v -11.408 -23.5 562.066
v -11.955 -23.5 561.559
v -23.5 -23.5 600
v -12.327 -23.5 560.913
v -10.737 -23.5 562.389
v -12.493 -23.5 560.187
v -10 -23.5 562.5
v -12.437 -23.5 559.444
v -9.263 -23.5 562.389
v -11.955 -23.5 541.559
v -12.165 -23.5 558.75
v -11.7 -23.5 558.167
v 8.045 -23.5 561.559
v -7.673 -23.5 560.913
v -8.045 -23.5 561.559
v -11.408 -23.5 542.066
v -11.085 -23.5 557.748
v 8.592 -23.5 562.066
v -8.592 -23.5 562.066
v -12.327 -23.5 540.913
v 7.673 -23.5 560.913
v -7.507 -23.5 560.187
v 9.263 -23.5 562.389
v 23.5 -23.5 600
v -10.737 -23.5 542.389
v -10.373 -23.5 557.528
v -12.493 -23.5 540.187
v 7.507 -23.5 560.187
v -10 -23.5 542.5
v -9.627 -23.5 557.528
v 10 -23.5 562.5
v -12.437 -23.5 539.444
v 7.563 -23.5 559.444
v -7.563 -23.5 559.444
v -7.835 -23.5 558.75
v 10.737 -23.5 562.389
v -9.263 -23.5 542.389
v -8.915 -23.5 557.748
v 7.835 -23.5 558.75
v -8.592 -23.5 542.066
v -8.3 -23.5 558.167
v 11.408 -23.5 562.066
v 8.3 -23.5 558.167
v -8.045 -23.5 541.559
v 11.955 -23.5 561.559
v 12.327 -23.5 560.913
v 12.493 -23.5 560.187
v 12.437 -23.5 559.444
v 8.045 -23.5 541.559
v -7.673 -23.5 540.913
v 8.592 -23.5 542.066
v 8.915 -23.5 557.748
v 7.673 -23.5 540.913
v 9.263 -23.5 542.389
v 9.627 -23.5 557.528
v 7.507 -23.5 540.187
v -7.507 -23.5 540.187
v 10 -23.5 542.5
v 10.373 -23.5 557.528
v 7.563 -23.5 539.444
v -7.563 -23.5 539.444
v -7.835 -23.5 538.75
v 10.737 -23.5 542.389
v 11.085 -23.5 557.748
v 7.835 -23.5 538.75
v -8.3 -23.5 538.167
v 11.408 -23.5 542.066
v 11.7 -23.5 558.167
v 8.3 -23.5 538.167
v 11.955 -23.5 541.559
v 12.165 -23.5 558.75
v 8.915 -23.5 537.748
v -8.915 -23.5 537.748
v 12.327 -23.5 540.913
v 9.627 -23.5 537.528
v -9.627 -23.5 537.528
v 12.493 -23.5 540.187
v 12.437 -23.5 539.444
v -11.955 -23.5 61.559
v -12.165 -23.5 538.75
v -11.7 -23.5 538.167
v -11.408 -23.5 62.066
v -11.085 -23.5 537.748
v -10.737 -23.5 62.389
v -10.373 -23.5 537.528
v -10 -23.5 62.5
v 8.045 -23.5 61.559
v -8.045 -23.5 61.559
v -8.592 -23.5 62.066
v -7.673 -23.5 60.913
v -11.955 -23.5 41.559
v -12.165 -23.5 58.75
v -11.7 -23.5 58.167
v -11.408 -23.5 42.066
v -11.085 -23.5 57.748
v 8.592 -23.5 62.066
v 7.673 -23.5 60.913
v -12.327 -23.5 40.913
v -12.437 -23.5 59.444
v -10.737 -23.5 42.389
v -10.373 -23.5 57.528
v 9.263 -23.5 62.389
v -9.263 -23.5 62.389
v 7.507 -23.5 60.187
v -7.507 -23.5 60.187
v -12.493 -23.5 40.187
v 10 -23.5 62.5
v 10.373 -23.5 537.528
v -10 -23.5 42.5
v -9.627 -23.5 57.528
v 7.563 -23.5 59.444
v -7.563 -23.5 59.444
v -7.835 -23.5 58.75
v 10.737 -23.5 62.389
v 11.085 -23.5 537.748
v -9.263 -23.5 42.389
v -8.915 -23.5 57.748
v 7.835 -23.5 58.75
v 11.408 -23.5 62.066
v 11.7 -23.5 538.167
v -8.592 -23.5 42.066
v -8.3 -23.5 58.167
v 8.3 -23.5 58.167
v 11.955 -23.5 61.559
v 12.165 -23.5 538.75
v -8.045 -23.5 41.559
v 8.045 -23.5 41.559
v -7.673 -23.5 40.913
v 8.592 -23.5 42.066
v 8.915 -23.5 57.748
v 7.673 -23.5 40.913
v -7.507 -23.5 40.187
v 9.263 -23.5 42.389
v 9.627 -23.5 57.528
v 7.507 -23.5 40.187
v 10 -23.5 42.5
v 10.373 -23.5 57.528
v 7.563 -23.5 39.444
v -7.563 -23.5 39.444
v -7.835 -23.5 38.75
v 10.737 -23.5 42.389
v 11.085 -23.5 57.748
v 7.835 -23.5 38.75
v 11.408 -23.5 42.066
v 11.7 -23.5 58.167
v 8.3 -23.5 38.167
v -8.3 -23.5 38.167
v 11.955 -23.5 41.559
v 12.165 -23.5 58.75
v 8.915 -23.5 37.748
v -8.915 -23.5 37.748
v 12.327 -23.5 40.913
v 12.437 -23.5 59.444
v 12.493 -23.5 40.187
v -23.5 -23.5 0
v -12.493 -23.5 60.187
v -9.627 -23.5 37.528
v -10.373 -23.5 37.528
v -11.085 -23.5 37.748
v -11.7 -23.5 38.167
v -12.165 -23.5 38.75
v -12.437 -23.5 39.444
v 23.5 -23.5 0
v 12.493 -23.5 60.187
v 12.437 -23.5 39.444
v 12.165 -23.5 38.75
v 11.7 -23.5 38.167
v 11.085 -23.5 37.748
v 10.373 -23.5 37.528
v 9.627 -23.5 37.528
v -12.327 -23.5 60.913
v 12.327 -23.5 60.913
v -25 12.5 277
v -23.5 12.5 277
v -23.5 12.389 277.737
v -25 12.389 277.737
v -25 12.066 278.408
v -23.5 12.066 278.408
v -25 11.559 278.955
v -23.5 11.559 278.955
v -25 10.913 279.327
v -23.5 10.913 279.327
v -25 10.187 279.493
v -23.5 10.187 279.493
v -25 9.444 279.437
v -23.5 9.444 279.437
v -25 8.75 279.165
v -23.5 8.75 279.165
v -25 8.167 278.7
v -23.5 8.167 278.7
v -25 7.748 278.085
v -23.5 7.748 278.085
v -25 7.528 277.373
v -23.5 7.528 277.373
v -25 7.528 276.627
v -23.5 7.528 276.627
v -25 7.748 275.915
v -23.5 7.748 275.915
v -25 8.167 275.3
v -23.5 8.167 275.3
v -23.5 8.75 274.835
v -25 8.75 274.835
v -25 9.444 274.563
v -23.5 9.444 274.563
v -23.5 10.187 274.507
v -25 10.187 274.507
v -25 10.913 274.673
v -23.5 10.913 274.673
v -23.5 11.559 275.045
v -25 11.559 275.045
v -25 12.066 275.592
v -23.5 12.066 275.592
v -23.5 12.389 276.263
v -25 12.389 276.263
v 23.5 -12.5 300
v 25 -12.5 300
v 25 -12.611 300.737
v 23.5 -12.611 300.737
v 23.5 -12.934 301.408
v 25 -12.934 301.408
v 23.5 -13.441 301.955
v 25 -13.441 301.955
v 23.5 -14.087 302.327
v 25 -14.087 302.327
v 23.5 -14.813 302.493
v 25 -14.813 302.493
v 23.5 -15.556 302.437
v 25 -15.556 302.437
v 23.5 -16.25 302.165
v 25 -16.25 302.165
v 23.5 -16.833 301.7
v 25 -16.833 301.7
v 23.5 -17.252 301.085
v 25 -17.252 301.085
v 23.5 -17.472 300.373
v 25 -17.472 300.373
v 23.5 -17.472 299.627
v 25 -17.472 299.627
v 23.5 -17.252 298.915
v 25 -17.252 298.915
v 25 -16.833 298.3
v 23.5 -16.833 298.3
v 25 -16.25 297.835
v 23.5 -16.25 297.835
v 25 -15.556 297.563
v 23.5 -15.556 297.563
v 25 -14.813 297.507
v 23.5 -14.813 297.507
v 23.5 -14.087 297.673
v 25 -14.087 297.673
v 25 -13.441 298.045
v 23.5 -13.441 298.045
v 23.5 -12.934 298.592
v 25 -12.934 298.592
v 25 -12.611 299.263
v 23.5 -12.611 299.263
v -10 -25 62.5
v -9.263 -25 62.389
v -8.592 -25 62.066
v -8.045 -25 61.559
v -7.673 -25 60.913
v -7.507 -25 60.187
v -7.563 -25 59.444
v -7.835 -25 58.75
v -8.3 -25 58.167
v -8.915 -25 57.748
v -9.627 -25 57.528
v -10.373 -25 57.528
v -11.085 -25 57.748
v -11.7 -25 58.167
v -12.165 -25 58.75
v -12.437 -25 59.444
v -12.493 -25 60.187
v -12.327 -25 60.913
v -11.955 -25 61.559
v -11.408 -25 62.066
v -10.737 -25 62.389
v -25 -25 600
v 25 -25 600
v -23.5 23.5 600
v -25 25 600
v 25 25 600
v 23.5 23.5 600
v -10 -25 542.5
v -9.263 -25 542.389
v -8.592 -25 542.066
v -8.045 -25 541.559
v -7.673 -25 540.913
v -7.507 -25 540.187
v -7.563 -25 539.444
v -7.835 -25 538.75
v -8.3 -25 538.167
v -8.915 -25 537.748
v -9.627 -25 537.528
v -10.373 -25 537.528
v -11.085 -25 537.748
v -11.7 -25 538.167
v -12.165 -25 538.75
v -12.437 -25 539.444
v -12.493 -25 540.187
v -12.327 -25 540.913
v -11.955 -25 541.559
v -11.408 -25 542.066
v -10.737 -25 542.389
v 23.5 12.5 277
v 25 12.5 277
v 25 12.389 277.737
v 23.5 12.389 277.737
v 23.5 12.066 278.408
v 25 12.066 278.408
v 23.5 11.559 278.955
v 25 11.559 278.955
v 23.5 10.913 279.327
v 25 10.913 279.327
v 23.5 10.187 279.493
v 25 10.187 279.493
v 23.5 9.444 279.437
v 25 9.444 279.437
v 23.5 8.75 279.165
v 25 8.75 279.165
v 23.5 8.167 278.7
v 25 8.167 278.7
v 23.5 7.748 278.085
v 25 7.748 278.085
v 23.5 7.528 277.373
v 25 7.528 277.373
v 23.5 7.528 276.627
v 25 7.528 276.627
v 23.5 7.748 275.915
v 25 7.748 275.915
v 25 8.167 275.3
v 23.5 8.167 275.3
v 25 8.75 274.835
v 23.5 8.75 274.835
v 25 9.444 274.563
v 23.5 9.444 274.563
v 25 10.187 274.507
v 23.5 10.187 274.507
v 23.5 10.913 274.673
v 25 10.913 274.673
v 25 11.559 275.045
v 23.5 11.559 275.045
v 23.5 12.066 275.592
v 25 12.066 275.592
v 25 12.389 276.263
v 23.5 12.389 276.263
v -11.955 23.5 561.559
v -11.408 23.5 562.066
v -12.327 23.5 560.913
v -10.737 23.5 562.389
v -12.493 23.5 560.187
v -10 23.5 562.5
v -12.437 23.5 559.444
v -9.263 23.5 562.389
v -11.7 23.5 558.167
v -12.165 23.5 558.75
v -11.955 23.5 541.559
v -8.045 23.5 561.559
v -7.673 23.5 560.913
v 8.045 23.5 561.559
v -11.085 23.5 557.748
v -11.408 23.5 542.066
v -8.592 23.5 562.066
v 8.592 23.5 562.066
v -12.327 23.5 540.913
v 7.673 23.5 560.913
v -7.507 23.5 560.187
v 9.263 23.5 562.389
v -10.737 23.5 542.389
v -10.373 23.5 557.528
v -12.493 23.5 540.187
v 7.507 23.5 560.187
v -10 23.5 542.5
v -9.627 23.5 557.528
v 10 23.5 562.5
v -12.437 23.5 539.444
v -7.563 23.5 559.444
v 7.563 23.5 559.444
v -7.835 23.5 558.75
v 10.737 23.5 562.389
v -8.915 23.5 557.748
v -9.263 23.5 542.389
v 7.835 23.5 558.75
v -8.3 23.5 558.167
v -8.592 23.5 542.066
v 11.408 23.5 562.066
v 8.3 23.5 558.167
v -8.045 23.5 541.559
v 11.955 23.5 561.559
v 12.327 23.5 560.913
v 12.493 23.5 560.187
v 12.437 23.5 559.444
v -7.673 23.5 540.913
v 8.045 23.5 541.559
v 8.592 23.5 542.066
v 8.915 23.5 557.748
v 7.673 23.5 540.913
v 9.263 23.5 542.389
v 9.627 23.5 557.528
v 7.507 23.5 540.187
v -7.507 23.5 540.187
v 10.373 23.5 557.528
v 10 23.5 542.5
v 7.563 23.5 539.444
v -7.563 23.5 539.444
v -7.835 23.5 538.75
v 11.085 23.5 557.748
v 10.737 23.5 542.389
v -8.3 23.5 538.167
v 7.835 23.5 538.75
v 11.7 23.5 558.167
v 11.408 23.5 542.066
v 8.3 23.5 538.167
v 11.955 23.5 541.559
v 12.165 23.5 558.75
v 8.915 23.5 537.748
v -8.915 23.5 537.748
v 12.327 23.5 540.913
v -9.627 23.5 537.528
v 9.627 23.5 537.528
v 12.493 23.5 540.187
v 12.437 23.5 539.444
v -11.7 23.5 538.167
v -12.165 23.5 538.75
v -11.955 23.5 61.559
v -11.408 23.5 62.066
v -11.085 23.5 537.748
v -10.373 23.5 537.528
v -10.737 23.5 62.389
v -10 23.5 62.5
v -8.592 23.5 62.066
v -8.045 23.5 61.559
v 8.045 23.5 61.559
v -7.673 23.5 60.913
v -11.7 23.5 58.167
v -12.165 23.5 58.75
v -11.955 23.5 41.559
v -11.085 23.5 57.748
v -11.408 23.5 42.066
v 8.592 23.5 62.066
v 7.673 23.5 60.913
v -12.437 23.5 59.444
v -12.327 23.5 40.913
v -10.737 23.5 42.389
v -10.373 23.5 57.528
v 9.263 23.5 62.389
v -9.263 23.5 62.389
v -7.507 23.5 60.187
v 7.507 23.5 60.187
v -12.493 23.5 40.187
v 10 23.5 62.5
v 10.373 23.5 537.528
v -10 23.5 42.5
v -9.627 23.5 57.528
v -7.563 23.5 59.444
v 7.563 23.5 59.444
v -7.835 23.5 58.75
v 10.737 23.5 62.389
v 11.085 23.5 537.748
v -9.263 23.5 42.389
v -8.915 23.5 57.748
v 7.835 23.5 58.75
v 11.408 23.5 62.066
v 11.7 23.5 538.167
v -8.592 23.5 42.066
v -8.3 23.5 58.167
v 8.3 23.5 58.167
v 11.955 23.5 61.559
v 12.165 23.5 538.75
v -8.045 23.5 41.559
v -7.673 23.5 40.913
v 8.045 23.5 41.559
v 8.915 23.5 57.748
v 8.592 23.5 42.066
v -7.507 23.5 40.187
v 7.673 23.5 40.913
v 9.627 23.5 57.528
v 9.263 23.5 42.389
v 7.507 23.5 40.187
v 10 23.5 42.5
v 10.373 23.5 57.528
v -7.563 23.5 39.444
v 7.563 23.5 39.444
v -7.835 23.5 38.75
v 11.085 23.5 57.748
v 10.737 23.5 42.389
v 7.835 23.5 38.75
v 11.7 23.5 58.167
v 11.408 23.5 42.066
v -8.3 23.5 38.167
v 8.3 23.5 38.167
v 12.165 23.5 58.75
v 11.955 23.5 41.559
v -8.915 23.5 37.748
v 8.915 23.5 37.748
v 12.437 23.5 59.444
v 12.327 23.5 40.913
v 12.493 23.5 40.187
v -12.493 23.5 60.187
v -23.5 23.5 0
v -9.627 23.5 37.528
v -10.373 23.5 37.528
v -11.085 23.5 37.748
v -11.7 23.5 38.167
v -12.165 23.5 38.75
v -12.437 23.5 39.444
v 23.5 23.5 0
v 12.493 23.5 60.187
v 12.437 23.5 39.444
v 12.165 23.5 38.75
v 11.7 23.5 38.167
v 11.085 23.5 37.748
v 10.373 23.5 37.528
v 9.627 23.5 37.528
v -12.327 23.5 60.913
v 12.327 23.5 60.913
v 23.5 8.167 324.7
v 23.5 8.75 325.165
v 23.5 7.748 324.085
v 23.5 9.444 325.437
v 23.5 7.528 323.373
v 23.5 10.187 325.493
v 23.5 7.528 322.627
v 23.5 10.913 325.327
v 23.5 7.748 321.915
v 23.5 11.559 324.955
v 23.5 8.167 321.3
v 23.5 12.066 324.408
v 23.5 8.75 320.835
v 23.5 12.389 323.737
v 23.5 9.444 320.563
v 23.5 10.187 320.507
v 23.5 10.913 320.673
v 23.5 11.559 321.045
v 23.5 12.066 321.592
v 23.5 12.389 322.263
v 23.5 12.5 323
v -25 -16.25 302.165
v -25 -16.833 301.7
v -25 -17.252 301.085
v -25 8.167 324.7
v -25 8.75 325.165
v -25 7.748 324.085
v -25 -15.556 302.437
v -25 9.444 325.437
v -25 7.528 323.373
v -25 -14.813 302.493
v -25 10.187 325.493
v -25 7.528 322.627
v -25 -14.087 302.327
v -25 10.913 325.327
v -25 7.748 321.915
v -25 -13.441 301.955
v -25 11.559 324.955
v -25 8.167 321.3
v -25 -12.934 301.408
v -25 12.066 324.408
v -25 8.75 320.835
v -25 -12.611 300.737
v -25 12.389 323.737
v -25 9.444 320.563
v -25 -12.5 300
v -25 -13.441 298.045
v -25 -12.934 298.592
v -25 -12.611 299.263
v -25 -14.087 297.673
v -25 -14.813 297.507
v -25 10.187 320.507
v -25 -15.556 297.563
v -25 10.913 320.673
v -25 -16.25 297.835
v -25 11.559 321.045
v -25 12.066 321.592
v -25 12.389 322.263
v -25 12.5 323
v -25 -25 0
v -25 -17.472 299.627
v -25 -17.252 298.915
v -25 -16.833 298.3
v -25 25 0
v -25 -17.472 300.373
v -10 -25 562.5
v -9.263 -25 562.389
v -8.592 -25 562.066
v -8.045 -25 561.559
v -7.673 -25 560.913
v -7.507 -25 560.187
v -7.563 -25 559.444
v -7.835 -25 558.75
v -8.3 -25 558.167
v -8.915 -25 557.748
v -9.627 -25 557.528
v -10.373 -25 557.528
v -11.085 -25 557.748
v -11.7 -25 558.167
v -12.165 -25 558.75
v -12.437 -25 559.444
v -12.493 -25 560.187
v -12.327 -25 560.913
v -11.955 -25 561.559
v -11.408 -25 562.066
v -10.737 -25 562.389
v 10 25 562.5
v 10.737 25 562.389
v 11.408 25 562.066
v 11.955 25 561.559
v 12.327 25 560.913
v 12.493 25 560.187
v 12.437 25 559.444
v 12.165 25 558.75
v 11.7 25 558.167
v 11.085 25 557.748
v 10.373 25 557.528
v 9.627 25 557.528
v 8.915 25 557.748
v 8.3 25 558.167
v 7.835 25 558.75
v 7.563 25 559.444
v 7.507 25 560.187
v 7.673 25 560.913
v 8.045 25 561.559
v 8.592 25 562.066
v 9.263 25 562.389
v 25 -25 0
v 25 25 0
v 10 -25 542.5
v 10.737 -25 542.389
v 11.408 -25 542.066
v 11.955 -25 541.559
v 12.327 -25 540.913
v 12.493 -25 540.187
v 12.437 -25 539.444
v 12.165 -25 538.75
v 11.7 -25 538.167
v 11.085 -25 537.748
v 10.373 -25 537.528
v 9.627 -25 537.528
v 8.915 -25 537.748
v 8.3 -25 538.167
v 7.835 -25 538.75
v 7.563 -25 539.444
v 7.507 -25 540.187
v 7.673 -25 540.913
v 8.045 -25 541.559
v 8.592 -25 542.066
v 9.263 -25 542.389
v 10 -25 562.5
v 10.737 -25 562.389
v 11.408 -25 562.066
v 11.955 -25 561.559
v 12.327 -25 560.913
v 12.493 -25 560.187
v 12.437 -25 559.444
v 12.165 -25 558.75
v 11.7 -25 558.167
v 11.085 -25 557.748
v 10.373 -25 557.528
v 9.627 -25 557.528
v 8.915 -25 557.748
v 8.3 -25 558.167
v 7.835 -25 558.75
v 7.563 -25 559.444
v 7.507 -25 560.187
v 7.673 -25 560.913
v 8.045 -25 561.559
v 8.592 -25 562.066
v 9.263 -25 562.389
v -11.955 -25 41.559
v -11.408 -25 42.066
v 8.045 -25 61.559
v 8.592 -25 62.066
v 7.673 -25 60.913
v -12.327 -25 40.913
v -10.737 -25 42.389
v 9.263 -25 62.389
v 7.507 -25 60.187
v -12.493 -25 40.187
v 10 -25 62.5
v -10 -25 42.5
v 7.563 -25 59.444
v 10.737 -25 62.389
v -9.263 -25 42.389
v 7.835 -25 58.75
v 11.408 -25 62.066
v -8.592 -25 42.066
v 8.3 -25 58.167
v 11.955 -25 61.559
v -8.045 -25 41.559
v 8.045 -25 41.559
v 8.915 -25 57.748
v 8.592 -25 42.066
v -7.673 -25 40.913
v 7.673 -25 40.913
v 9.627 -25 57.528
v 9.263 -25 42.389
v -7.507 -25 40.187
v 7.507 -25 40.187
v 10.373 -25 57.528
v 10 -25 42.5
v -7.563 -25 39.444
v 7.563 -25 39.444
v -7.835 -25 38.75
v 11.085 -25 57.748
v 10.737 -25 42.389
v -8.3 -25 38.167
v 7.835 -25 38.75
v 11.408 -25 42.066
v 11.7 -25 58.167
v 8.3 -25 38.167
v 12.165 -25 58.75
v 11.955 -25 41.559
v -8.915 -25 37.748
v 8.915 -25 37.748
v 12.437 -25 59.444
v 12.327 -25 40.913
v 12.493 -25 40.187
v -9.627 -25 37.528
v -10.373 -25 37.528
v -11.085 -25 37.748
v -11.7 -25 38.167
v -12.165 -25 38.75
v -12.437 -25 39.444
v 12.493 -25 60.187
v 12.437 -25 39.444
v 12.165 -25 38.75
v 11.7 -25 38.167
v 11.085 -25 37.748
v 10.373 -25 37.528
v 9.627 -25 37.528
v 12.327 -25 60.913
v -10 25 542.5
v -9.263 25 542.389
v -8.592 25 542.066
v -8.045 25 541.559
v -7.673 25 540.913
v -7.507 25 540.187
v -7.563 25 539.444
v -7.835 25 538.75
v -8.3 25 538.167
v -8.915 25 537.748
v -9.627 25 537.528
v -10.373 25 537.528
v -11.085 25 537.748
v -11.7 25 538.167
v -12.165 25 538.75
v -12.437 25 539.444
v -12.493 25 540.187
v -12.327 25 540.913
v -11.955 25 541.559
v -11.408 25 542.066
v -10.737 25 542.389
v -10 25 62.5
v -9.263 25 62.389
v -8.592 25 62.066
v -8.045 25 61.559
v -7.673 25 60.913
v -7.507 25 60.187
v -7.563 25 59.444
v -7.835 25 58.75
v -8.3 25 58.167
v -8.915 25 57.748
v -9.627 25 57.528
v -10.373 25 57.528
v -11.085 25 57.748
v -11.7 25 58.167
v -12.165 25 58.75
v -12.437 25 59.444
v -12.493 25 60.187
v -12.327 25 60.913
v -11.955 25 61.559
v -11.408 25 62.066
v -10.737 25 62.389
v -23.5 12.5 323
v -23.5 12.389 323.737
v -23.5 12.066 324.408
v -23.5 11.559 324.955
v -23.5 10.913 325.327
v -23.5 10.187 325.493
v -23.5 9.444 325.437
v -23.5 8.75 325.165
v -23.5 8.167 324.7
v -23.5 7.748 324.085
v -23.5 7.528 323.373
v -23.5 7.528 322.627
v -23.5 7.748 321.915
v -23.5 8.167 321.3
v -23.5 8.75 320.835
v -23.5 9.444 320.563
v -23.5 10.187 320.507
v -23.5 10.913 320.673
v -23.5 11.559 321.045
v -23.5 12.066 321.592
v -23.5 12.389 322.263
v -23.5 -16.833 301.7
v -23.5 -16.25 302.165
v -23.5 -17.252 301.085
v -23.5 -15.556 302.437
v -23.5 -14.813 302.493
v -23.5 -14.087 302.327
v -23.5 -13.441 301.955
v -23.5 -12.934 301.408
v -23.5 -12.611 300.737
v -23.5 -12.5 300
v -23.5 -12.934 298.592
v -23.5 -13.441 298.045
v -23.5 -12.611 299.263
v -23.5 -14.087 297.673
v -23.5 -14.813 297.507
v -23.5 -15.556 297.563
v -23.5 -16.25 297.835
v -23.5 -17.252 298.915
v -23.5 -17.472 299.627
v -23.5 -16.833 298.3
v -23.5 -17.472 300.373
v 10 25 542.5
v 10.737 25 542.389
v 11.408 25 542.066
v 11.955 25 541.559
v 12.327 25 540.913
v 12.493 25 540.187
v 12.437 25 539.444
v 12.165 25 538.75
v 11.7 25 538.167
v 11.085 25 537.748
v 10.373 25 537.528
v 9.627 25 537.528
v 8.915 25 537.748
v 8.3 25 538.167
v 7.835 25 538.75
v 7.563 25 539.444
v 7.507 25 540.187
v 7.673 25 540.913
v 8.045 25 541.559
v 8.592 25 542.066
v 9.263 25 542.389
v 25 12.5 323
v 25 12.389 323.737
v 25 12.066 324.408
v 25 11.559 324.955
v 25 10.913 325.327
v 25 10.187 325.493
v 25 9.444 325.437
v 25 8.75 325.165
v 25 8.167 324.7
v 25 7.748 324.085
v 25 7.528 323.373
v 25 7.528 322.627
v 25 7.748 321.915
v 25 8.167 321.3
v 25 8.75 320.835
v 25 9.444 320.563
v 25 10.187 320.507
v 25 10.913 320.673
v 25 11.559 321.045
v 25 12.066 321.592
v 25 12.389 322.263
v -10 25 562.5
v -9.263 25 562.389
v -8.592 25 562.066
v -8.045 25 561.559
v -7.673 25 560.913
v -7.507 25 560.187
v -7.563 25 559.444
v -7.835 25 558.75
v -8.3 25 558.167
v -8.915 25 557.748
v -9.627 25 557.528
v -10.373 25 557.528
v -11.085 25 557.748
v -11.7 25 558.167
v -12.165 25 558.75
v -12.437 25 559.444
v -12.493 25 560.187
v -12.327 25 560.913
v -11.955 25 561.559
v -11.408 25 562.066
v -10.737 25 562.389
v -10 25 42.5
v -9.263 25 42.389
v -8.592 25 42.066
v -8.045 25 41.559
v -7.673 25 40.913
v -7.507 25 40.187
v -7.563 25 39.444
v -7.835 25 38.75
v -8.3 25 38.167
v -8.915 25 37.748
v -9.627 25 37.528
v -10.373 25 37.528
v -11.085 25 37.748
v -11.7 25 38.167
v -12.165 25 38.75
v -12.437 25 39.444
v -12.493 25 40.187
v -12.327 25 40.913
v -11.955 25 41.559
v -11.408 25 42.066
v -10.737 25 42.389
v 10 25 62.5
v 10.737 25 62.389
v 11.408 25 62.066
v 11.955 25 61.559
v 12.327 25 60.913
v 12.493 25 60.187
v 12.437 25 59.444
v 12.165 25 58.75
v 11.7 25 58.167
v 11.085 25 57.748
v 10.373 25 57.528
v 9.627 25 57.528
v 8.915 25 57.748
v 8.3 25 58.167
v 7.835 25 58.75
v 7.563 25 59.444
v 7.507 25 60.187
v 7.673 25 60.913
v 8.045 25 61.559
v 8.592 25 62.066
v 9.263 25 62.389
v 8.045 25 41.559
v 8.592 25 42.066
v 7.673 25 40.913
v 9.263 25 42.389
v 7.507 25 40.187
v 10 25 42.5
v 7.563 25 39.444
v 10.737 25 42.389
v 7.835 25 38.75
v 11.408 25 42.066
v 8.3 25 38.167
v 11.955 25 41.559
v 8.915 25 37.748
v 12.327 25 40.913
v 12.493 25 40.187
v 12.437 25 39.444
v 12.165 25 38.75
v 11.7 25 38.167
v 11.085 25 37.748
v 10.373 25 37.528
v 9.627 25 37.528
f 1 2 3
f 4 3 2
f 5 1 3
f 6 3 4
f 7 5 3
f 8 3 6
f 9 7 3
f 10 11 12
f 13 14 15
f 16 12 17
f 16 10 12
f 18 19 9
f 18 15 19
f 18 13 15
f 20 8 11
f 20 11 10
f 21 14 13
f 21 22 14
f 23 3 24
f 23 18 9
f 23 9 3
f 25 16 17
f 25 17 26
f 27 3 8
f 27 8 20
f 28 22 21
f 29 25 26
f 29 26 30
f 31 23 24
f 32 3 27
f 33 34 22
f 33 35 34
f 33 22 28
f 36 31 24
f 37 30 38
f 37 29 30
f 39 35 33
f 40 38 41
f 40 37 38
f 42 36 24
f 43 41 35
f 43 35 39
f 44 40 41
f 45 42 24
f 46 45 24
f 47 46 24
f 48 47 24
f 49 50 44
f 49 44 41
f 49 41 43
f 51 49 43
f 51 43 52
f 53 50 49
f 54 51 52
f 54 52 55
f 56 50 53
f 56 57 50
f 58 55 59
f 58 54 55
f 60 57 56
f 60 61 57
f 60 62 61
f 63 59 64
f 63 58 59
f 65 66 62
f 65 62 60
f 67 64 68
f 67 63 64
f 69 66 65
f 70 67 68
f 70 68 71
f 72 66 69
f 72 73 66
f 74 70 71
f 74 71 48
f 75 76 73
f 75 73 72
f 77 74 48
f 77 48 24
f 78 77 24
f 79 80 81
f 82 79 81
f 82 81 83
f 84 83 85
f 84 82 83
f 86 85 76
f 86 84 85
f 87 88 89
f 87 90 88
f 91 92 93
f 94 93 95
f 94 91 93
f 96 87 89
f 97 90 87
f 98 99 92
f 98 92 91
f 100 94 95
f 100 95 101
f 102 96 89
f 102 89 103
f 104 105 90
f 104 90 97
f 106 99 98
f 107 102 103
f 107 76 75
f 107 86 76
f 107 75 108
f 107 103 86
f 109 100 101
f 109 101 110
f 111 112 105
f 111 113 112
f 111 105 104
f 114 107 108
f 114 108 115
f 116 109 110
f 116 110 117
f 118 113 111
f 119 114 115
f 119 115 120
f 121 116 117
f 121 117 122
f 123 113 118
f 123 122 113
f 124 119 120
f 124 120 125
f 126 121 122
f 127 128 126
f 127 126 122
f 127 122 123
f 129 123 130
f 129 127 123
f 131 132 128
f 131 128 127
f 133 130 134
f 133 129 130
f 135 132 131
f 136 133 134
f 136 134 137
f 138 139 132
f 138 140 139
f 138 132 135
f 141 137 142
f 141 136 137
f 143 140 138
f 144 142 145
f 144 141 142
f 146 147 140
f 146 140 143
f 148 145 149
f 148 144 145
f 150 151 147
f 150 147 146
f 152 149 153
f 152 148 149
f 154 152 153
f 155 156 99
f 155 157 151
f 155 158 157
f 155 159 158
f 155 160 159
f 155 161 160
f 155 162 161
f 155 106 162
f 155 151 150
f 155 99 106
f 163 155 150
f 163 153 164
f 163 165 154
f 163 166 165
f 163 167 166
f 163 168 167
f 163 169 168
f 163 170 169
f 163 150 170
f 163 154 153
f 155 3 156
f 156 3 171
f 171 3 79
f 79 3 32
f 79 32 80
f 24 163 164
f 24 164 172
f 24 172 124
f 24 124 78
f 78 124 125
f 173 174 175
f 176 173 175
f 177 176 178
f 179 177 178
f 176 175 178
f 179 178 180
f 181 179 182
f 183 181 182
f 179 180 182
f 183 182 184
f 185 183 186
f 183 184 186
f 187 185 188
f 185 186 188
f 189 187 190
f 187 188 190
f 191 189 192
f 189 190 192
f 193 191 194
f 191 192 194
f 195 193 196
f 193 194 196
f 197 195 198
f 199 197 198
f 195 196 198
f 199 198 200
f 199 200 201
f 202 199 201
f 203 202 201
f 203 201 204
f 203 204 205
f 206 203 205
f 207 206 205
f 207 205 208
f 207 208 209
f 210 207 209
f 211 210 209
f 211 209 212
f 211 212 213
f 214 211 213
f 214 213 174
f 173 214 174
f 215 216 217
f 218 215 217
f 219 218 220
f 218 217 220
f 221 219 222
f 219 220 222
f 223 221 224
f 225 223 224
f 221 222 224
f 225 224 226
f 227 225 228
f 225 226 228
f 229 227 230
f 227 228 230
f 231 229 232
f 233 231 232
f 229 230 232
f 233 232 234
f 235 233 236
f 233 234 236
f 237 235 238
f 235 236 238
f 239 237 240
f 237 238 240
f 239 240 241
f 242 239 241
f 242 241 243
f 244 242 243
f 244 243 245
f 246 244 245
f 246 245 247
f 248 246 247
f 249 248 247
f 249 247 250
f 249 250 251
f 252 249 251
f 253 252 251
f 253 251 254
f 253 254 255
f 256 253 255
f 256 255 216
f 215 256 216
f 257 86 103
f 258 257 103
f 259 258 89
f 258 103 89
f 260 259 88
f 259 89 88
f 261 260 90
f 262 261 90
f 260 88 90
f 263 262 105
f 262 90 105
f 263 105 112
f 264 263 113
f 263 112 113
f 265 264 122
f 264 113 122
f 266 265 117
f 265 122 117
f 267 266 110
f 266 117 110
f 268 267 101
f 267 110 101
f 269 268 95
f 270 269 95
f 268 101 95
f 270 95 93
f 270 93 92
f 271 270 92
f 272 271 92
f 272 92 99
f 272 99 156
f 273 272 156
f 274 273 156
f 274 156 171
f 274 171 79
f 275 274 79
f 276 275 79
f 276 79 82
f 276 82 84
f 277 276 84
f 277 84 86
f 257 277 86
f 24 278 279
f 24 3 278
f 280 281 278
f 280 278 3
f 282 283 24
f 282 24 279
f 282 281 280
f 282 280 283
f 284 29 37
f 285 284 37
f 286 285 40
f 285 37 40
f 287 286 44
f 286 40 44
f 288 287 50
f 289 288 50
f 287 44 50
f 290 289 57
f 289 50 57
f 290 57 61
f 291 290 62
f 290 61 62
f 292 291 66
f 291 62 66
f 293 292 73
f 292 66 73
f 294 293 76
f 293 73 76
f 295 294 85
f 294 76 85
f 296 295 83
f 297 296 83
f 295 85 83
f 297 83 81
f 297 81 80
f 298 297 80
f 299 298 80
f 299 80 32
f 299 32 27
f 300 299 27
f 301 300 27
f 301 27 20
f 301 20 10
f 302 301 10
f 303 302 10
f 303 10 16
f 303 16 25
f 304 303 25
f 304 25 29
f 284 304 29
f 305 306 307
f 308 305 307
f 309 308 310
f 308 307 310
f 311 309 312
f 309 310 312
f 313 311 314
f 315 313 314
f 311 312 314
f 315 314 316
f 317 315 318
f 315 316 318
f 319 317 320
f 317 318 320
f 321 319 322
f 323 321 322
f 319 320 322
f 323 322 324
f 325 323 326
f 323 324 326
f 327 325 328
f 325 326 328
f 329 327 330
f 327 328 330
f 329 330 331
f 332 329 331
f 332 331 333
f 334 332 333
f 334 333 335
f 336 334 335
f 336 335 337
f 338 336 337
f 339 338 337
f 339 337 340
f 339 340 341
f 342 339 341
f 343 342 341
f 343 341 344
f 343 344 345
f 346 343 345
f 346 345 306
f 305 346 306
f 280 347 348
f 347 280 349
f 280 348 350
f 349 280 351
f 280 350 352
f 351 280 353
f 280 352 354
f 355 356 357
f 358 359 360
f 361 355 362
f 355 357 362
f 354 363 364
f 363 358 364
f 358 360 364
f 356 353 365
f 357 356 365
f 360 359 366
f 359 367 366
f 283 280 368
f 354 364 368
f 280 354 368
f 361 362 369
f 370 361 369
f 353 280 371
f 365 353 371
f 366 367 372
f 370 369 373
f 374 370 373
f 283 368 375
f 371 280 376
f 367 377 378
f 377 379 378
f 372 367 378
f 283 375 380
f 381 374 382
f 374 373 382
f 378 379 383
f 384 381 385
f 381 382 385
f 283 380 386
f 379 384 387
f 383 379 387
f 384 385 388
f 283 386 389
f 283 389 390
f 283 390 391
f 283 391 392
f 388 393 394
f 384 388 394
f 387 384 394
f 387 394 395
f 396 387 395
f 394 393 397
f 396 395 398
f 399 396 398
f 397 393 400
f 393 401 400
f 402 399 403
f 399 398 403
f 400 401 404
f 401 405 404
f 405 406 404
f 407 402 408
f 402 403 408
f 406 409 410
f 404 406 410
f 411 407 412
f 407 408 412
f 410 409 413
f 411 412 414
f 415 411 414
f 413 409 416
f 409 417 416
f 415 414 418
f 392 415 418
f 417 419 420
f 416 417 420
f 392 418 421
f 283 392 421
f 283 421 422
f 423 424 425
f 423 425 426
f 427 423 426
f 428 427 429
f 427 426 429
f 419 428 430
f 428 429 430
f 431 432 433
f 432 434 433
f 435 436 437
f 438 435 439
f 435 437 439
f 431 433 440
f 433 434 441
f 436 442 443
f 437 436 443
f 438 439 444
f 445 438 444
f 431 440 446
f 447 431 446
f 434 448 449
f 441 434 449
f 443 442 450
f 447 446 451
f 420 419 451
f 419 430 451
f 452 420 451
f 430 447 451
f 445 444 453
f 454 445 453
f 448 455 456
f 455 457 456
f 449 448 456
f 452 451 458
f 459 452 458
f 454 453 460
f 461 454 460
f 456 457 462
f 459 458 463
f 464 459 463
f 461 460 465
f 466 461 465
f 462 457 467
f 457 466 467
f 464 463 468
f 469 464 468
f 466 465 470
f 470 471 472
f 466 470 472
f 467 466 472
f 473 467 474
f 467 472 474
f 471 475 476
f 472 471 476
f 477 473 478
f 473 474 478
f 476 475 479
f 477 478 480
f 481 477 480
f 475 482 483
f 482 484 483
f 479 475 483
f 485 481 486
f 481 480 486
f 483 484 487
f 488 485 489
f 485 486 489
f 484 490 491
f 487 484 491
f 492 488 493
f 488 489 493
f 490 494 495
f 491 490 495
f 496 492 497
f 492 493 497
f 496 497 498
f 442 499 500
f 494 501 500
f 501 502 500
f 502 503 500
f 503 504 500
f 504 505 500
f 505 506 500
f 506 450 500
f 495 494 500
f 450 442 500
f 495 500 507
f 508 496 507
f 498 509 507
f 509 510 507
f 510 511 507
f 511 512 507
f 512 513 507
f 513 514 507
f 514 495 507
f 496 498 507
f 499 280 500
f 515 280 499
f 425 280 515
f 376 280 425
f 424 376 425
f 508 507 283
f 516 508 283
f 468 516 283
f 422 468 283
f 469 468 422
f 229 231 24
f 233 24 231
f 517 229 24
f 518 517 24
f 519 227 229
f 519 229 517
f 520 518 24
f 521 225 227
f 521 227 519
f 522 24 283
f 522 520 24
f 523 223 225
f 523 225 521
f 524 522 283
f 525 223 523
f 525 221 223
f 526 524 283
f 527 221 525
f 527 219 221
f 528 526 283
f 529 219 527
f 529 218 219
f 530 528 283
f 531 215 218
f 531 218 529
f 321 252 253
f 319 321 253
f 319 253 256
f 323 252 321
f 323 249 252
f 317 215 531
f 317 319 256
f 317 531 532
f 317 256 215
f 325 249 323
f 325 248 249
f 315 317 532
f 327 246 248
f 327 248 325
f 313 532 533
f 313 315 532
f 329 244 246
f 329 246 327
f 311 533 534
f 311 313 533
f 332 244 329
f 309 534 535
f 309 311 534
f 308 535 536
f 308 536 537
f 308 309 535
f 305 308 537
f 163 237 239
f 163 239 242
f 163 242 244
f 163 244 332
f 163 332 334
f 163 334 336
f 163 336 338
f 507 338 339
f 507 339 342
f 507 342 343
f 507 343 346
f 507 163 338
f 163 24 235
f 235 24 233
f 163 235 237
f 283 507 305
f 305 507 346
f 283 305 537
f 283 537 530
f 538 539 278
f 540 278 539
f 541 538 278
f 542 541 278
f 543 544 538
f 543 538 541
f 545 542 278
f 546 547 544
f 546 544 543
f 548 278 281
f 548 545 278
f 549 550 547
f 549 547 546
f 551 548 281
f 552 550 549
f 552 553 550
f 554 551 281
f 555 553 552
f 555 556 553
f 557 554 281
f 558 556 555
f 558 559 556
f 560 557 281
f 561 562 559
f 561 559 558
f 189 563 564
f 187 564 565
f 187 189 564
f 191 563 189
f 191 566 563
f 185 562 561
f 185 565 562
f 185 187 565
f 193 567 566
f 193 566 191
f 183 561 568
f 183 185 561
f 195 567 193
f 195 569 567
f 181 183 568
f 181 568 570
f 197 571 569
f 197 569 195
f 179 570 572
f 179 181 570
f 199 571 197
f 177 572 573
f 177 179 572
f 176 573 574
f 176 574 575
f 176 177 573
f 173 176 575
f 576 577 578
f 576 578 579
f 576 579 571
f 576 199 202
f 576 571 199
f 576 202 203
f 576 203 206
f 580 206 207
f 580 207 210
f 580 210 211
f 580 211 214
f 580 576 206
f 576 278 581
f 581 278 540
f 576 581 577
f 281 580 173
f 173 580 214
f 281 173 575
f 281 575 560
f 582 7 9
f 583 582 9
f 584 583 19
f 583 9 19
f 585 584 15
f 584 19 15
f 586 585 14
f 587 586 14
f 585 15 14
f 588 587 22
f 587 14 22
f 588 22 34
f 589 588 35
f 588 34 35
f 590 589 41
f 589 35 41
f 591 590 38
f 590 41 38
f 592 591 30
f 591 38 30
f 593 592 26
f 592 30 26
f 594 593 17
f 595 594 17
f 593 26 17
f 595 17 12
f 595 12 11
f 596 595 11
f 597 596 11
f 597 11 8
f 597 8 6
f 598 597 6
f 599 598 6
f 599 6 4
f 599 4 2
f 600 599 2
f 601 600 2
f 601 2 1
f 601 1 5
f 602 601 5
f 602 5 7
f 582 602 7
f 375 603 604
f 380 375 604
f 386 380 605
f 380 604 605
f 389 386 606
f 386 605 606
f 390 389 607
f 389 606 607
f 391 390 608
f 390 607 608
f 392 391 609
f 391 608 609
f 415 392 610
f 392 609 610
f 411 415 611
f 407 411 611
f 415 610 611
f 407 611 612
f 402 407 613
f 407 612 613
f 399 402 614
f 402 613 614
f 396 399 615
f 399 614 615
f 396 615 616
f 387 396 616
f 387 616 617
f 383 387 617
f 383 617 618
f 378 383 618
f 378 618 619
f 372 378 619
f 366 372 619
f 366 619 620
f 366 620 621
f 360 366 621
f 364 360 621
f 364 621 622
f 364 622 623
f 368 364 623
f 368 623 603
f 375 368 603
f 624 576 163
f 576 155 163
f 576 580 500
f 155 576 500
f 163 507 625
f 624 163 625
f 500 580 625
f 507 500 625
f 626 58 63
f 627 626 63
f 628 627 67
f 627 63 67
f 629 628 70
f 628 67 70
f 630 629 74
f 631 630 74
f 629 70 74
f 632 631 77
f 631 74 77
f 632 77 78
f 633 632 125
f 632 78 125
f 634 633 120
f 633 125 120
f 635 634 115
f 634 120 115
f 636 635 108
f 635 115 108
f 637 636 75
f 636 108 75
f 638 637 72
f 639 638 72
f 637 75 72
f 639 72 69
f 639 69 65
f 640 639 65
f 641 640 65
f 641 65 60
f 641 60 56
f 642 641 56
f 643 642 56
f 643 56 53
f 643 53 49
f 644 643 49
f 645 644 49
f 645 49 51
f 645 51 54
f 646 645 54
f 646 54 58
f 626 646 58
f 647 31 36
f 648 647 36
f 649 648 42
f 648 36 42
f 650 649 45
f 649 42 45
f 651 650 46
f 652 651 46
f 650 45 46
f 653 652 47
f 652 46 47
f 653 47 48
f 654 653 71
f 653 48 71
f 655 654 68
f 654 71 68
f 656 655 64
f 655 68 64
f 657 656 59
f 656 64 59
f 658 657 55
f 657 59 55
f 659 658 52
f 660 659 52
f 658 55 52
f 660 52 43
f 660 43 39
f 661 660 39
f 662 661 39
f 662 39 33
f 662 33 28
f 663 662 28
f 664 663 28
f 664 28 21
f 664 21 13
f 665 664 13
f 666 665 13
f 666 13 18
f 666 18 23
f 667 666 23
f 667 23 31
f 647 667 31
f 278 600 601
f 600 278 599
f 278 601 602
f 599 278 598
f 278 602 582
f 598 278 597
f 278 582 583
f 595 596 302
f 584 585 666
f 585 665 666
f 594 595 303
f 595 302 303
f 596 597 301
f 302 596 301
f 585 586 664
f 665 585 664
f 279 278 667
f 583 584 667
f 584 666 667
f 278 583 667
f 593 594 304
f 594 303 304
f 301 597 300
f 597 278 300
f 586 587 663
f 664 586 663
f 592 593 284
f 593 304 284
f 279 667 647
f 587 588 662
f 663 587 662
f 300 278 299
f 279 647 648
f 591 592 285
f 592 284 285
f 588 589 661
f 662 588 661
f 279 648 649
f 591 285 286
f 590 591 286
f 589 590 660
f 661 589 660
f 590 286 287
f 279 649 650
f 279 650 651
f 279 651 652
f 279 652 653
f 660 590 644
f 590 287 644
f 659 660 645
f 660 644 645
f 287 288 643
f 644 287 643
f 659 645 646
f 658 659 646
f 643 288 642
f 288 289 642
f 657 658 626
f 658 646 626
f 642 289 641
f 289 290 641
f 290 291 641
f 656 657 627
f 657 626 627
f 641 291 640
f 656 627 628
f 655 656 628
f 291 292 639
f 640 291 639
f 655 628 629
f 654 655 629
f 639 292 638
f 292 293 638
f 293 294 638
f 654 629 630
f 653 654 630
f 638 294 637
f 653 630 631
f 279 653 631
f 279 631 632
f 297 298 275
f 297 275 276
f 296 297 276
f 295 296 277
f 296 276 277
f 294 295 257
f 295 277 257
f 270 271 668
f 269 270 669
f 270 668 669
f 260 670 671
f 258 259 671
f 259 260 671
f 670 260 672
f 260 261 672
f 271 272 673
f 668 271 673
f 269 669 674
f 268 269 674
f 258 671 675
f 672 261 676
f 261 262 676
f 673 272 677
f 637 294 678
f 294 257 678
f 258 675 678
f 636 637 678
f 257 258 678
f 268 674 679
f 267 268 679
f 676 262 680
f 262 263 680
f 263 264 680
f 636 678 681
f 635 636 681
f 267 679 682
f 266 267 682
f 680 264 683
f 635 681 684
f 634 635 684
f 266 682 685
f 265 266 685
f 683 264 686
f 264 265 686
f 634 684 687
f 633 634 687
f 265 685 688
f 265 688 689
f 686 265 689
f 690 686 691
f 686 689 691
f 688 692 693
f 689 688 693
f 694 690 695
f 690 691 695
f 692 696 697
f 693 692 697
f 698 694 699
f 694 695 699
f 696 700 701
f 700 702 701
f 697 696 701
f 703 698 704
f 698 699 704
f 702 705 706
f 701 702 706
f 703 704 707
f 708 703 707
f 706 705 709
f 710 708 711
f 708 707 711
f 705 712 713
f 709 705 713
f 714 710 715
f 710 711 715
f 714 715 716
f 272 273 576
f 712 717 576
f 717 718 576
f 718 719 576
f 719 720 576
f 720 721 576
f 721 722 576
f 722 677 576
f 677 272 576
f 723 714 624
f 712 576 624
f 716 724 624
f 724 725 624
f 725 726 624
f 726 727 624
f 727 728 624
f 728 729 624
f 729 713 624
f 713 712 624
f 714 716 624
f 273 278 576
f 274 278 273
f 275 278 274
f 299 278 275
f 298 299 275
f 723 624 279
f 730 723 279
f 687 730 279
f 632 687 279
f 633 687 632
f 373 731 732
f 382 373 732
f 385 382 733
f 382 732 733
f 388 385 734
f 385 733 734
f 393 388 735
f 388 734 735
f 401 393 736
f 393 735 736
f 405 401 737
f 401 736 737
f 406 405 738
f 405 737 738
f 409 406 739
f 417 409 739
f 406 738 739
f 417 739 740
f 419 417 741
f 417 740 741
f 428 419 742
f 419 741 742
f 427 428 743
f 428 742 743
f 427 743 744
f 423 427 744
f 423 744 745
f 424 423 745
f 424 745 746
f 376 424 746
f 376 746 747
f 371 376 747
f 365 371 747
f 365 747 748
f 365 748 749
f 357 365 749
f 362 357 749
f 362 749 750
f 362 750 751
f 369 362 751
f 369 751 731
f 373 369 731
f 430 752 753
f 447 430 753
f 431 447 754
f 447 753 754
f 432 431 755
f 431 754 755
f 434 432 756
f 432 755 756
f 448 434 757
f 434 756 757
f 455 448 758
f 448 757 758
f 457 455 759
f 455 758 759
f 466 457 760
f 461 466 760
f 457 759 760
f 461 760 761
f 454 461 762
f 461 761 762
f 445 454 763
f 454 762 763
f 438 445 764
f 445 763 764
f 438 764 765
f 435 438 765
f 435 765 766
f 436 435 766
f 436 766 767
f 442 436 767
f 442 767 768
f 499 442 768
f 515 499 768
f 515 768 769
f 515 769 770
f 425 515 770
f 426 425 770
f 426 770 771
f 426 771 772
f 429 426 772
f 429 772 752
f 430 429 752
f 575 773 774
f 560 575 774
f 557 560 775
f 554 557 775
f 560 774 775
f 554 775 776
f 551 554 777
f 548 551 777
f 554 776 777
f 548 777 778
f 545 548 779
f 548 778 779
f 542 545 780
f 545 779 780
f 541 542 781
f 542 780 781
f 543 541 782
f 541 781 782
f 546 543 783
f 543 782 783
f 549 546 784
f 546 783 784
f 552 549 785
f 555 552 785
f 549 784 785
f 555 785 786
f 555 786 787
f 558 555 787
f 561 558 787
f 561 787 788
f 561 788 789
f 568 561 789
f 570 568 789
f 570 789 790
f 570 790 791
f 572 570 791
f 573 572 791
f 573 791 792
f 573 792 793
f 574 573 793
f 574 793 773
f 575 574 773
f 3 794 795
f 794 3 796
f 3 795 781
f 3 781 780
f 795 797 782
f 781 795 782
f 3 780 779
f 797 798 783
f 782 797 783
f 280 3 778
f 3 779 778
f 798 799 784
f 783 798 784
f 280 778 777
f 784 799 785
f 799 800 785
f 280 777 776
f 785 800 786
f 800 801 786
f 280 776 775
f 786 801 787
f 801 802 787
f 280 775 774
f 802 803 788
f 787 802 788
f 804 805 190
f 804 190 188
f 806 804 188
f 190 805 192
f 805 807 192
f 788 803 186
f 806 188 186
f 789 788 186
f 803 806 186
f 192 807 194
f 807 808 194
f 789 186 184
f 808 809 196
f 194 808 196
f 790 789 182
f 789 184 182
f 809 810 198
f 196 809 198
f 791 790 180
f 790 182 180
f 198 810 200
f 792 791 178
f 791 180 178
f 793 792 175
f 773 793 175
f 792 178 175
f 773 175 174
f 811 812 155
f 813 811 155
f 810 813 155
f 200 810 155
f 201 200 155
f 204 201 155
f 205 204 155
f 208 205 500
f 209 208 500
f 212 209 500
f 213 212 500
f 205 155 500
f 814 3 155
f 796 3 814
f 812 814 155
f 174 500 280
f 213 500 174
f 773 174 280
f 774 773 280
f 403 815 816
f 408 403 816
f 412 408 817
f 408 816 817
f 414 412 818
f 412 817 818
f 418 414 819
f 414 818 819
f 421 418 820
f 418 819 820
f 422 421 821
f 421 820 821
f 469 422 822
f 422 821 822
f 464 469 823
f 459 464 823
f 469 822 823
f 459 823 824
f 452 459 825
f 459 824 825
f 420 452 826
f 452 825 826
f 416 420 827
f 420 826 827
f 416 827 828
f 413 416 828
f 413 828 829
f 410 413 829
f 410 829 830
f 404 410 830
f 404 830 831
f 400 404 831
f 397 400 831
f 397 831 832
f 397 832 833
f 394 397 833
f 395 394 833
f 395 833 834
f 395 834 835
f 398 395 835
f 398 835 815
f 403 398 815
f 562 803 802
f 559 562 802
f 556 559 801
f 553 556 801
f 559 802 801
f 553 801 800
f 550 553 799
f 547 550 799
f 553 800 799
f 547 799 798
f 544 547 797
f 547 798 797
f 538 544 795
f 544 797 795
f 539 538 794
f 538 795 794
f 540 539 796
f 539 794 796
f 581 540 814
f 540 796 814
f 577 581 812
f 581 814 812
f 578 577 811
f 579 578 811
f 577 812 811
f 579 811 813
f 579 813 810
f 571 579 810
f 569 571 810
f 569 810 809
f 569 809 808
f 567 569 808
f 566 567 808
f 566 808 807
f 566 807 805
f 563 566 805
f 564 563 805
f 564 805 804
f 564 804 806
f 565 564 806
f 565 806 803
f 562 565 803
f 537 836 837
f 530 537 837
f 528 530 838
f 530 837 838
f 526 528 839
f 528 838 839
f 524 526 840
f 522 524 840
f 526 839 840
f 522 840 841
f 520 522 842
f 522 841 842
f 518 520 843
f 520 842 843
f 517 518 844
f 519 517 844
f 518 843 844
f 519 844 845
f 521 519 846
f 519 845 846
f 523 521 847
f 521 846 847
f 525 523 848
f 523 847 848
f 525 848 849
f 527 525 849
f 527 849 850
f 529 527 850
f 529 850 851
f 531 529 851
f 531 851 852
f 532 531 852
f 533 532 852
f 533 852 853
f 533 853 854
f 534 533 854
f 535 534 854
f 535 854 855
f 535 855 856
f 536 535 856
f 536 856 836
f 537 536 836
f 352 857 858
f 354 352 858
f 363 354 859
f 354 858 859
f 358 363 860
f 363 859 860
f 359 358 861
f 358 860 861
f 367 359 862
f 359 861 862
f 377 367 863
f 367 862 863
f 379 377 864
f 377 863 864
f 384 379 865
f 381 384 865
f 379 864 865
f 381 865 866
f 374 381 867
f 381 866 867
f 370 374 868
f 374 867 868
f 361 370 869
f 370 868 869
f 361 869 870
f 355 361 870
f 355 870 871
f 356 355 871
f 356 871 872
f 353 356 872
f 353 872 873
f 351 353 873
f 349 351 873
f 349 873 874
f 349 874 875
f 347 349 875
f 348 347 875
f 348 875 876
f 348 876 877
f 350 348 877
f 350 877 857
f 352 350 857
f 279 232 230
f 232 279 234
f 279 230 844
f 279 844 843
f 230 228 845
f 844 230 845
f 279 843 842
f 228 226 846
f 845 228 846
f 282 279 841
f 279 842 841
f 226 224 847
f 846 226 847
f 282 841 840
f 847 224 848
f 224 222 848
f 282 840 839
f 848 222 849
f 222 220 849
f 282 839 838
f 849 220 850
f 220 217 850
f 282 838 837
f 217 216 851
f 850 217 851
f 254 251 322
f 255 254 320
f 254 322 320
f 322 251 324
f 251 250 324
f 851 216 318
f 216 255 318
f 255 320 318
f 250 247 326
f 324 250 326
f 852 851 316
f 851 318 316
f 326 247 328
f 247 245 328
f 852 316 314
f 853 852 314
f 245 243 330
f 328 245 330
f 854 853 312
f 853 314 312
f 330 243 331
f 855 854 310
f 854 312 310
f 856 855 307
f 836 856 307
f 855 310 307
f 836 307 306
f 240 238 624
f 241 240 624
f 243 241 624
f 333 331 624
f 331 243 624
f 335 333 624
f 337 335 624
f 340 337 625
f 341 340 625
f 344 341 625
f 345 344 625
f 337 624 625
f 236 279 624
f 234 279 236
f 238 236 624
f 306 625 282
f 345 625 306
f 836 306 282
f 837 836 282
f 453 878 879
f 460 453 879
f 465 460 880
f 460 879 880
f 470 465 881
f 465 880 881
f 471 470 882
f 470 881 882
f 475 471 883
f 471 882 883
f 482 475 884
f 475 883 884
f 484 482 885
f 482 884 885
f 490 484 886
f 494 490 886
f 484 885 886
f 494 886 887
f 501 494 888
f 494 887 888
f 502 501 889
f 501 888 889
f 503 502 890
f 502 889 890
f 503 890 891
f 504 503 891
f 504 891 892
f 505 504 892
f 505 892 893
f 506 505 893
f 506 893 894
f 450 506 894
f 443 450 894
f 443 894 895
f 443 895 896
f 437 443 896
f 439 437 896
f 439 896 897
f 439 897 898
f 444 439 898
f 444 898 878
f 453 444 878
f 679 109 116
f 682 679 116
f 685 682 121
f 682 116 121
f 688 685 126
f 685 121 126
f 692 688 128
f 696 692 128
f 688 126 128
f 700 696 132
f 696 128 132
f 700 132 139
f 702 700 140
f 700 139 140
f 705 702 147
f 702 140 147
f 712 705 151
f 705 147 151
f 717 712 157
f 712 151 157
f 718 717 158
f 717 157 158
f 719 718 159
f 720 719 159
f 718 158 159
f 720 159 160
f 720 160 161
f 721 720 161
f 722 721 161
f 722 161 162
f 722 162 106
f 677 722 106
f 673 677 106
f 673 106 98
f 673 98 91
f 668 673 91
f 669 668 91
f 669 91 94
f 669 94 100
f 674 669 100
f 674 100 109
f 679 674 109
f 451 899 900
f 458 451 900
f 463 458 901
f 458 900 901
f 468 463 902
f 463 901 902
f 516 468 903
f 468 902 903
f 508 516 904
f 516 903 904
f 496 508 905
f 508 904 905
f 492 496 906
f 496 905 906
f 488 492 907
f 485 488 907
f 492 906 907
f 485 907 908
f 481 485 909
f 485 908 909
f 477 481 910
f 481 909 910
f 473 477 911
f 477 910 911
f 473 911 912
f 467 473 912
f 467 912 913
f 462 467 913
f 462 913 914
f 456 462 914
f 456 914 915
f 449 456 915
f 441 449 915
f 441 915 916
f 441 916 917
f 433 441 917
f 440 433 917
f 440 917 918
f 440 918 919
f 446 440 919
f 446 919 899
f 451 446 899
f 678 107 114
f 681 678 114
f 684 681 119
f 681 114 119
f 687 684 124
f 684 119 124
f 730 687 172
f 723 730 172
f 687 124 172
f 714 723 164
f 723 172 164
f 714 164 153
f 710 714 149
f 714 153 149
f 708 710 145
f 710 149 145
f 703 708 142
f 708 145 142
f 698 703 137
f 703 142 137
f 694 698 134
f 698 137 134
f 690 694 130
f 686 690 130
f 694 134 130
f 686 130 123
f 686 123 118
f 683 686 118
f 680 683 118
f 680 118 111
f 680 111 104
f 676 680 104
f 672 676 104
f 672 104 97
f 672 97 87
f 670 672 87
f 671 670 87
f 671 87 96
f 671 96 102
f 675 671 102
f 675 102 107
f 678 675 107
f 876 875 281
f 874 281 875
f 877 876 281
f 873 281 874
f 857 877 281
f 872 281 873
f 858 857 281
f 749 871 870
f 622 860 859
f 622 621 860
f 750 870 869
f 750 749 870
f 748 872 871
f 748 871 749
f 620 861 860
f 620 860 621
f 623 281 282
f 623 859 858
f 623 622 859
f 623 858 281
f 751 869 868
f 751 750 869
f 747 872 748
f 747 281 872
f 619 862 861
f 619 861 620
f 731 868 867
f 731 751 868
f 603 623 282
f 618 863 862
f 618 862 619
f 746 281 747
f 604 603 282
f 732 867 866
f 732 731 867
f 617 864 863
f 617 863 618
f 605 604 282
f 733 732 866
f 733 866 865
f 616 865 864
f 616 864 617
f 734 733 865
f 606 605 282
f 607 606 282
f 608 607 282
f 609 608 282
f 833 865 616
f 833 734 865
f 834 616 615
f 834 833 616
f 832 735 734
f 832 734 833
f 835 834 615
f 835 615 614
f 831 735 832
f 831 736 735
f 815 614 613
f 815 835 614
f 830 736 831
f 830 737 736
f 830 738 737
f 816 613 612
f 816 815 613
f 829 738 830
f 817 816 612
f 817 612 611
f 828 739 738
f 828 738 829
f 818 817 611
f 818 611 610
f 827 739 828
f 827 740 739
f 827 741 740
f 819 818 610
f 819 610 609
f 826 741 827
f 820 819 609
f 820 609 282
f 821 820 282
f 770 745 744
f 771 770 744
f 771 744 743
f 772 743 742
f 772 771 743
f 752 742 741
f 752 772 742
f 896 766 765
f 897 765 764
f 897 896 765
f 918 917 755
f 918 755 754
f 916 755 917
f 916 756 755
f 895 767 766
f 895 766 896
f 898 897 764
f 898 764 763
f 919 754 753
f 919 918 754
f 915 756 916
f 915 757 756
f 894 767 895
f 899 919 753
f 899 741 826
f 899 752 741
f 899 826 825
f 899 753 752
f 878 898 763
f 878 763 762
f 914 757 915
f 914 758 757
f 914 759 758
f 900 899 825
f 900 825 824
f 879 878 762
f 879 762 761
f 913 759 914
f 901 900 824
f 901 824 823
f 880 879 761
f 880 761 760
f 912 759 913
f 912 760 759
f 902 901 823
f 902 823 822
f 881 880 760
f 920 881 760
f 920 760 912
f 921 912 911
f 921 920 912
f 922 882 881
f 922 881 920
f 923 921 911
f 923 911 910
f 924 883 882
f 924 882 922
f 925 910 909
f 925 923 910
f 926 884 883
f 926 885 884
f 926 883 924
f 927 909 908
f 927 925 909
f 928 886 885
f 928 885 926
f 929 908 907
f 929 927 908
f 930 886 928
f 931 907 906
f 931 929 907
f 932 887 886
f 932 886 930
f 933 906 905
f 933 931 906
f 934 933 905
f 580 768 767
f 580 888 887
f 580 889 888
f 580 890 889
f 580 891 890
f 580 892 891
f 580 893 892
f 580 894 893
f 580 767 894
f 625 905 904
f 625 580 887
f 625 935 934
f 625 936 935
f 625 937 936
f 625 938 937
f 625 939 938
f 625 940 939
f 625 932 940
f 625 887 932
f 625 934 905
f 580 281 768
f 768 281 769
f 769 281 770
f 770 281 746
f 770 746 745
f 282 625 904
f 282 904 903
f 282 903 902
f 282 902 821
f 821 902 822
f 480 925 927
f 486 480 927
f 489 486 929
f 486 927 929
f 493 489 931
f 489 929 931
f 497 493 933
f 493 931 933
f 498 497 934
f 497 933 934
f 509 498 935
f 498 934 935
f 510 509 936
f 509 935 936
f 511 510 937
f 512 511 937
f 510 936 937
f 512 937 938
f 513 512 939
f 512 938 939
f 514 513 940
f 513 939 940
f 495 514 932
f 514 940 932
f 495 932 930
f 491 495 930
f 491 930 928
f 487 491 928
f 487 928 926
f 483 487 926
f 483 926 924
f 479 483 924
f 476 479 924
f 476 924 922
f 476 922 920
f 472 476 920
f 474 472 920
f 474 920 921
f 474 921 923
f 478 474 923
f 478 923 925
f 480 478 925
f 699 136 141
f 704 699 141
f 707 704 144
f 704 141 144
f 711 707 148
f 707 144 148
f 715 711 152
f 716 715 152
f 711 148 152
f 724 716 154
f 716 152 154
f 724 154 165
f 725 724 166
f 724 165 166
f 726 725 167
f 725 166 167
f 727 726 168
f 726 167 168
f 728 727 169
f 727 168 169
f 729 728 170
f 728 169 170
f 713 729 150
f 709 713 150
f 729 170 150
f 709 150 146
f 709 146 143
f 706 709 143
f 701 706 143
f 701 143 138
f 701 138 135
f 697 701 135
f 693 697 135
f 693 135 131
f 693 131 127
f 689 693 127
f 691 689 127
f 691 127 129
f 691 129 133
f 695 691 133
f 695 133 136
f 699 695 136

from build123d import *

# Parameters (mm, degrees)
SKETCH1_W           = 50
SKETCH1_H           = 50
SKETCH1_W_2         = 47
SKETCH1_H_2         = 47
BOSS_EXTRUDE1_DEPTH = 600
SKETCH2_R           = 2.5
CUT_EXTRUDE1_DEPTH  = 59
SKETCH3_R           = 2.5
CUT_EXTRUDE2_DEPTH  = 603.59853966


with BuildPart() as part:
    # Sketch1 → Boss-Extrude1 (new body)
    with BuildSketch(Plane.XY):
        Rectangle(SKETCH1_W, SKETCH1_H)
        Rectangle(SKETCH1_W_2, SKETCH1_H_2, mode=Mode.SUBTRACT)
    extrude(amount=BOSS_EXTRUDE1_DEPTH)

    # Sketch2 → Cut-Extrude1 (cut)
    with BuildSketch(Plane(origin=(25, 0, 0), x_dir=(0, 0, -1), z_dir=(1, 0, 0))):
        with Locations(Location((-300, -15, 0), (0, 0, 90))):
            Circle(SKETCH2_R)
        with Locations(Location((-277, 10, 0), (0, 0, 90))):
            Circle(SKETCH2_R)
        with Locations(Location((-323, 10, 0), (0, 0, 90))):
            Circle(SKETCH2_R)
    extrude(amount=-CUT_EXTRUDE1_DEPTH, mode=Mode.SUBTRACT)

    # Sketch3 → Cut-Extrude2 (cut, through all)
    with BuildSketch(Plane(origin=(0, 25, 0), x_dir=(1, 0, 0), z_dir=(0, 1, 0))):
        with Locations(Location((-10, -40, 0), (0, 0, 270))):
            Circle(SKETCH3_R)
        with Locations(Location((10, -40, 0), (0, 0, 270))):
            Circle(SKETCH3_R)
        with Locations(Location((-10, -60, 0), (0, 0, 270))):
            Circle(SKETCH3_R)
        with Locations(Location((10, -60, 0), (0, 0, 270))):
            Circle(SKETCH3_R)
        with Locations(Location((10, -540, 0), (0, 0, 270))):
            Circle(SKETCH3_R)
        with Locations(Location((-10, -540, 0), (0, 0, 270))):
            Circle(SKETCH3_R)
        with Locations(Location((10, -560, 0), (0, 0, 270))):
            Circle(SKETCH3_R)
        with Locations(Location((-10, -560, 0), (0, 0, 270))):
            Circle(SKETCH3_R)
    extrude(amount=-CUT_EXTRUDE2_DEPTH, mode=Mode.SUBTRACT)


solid = part.part
